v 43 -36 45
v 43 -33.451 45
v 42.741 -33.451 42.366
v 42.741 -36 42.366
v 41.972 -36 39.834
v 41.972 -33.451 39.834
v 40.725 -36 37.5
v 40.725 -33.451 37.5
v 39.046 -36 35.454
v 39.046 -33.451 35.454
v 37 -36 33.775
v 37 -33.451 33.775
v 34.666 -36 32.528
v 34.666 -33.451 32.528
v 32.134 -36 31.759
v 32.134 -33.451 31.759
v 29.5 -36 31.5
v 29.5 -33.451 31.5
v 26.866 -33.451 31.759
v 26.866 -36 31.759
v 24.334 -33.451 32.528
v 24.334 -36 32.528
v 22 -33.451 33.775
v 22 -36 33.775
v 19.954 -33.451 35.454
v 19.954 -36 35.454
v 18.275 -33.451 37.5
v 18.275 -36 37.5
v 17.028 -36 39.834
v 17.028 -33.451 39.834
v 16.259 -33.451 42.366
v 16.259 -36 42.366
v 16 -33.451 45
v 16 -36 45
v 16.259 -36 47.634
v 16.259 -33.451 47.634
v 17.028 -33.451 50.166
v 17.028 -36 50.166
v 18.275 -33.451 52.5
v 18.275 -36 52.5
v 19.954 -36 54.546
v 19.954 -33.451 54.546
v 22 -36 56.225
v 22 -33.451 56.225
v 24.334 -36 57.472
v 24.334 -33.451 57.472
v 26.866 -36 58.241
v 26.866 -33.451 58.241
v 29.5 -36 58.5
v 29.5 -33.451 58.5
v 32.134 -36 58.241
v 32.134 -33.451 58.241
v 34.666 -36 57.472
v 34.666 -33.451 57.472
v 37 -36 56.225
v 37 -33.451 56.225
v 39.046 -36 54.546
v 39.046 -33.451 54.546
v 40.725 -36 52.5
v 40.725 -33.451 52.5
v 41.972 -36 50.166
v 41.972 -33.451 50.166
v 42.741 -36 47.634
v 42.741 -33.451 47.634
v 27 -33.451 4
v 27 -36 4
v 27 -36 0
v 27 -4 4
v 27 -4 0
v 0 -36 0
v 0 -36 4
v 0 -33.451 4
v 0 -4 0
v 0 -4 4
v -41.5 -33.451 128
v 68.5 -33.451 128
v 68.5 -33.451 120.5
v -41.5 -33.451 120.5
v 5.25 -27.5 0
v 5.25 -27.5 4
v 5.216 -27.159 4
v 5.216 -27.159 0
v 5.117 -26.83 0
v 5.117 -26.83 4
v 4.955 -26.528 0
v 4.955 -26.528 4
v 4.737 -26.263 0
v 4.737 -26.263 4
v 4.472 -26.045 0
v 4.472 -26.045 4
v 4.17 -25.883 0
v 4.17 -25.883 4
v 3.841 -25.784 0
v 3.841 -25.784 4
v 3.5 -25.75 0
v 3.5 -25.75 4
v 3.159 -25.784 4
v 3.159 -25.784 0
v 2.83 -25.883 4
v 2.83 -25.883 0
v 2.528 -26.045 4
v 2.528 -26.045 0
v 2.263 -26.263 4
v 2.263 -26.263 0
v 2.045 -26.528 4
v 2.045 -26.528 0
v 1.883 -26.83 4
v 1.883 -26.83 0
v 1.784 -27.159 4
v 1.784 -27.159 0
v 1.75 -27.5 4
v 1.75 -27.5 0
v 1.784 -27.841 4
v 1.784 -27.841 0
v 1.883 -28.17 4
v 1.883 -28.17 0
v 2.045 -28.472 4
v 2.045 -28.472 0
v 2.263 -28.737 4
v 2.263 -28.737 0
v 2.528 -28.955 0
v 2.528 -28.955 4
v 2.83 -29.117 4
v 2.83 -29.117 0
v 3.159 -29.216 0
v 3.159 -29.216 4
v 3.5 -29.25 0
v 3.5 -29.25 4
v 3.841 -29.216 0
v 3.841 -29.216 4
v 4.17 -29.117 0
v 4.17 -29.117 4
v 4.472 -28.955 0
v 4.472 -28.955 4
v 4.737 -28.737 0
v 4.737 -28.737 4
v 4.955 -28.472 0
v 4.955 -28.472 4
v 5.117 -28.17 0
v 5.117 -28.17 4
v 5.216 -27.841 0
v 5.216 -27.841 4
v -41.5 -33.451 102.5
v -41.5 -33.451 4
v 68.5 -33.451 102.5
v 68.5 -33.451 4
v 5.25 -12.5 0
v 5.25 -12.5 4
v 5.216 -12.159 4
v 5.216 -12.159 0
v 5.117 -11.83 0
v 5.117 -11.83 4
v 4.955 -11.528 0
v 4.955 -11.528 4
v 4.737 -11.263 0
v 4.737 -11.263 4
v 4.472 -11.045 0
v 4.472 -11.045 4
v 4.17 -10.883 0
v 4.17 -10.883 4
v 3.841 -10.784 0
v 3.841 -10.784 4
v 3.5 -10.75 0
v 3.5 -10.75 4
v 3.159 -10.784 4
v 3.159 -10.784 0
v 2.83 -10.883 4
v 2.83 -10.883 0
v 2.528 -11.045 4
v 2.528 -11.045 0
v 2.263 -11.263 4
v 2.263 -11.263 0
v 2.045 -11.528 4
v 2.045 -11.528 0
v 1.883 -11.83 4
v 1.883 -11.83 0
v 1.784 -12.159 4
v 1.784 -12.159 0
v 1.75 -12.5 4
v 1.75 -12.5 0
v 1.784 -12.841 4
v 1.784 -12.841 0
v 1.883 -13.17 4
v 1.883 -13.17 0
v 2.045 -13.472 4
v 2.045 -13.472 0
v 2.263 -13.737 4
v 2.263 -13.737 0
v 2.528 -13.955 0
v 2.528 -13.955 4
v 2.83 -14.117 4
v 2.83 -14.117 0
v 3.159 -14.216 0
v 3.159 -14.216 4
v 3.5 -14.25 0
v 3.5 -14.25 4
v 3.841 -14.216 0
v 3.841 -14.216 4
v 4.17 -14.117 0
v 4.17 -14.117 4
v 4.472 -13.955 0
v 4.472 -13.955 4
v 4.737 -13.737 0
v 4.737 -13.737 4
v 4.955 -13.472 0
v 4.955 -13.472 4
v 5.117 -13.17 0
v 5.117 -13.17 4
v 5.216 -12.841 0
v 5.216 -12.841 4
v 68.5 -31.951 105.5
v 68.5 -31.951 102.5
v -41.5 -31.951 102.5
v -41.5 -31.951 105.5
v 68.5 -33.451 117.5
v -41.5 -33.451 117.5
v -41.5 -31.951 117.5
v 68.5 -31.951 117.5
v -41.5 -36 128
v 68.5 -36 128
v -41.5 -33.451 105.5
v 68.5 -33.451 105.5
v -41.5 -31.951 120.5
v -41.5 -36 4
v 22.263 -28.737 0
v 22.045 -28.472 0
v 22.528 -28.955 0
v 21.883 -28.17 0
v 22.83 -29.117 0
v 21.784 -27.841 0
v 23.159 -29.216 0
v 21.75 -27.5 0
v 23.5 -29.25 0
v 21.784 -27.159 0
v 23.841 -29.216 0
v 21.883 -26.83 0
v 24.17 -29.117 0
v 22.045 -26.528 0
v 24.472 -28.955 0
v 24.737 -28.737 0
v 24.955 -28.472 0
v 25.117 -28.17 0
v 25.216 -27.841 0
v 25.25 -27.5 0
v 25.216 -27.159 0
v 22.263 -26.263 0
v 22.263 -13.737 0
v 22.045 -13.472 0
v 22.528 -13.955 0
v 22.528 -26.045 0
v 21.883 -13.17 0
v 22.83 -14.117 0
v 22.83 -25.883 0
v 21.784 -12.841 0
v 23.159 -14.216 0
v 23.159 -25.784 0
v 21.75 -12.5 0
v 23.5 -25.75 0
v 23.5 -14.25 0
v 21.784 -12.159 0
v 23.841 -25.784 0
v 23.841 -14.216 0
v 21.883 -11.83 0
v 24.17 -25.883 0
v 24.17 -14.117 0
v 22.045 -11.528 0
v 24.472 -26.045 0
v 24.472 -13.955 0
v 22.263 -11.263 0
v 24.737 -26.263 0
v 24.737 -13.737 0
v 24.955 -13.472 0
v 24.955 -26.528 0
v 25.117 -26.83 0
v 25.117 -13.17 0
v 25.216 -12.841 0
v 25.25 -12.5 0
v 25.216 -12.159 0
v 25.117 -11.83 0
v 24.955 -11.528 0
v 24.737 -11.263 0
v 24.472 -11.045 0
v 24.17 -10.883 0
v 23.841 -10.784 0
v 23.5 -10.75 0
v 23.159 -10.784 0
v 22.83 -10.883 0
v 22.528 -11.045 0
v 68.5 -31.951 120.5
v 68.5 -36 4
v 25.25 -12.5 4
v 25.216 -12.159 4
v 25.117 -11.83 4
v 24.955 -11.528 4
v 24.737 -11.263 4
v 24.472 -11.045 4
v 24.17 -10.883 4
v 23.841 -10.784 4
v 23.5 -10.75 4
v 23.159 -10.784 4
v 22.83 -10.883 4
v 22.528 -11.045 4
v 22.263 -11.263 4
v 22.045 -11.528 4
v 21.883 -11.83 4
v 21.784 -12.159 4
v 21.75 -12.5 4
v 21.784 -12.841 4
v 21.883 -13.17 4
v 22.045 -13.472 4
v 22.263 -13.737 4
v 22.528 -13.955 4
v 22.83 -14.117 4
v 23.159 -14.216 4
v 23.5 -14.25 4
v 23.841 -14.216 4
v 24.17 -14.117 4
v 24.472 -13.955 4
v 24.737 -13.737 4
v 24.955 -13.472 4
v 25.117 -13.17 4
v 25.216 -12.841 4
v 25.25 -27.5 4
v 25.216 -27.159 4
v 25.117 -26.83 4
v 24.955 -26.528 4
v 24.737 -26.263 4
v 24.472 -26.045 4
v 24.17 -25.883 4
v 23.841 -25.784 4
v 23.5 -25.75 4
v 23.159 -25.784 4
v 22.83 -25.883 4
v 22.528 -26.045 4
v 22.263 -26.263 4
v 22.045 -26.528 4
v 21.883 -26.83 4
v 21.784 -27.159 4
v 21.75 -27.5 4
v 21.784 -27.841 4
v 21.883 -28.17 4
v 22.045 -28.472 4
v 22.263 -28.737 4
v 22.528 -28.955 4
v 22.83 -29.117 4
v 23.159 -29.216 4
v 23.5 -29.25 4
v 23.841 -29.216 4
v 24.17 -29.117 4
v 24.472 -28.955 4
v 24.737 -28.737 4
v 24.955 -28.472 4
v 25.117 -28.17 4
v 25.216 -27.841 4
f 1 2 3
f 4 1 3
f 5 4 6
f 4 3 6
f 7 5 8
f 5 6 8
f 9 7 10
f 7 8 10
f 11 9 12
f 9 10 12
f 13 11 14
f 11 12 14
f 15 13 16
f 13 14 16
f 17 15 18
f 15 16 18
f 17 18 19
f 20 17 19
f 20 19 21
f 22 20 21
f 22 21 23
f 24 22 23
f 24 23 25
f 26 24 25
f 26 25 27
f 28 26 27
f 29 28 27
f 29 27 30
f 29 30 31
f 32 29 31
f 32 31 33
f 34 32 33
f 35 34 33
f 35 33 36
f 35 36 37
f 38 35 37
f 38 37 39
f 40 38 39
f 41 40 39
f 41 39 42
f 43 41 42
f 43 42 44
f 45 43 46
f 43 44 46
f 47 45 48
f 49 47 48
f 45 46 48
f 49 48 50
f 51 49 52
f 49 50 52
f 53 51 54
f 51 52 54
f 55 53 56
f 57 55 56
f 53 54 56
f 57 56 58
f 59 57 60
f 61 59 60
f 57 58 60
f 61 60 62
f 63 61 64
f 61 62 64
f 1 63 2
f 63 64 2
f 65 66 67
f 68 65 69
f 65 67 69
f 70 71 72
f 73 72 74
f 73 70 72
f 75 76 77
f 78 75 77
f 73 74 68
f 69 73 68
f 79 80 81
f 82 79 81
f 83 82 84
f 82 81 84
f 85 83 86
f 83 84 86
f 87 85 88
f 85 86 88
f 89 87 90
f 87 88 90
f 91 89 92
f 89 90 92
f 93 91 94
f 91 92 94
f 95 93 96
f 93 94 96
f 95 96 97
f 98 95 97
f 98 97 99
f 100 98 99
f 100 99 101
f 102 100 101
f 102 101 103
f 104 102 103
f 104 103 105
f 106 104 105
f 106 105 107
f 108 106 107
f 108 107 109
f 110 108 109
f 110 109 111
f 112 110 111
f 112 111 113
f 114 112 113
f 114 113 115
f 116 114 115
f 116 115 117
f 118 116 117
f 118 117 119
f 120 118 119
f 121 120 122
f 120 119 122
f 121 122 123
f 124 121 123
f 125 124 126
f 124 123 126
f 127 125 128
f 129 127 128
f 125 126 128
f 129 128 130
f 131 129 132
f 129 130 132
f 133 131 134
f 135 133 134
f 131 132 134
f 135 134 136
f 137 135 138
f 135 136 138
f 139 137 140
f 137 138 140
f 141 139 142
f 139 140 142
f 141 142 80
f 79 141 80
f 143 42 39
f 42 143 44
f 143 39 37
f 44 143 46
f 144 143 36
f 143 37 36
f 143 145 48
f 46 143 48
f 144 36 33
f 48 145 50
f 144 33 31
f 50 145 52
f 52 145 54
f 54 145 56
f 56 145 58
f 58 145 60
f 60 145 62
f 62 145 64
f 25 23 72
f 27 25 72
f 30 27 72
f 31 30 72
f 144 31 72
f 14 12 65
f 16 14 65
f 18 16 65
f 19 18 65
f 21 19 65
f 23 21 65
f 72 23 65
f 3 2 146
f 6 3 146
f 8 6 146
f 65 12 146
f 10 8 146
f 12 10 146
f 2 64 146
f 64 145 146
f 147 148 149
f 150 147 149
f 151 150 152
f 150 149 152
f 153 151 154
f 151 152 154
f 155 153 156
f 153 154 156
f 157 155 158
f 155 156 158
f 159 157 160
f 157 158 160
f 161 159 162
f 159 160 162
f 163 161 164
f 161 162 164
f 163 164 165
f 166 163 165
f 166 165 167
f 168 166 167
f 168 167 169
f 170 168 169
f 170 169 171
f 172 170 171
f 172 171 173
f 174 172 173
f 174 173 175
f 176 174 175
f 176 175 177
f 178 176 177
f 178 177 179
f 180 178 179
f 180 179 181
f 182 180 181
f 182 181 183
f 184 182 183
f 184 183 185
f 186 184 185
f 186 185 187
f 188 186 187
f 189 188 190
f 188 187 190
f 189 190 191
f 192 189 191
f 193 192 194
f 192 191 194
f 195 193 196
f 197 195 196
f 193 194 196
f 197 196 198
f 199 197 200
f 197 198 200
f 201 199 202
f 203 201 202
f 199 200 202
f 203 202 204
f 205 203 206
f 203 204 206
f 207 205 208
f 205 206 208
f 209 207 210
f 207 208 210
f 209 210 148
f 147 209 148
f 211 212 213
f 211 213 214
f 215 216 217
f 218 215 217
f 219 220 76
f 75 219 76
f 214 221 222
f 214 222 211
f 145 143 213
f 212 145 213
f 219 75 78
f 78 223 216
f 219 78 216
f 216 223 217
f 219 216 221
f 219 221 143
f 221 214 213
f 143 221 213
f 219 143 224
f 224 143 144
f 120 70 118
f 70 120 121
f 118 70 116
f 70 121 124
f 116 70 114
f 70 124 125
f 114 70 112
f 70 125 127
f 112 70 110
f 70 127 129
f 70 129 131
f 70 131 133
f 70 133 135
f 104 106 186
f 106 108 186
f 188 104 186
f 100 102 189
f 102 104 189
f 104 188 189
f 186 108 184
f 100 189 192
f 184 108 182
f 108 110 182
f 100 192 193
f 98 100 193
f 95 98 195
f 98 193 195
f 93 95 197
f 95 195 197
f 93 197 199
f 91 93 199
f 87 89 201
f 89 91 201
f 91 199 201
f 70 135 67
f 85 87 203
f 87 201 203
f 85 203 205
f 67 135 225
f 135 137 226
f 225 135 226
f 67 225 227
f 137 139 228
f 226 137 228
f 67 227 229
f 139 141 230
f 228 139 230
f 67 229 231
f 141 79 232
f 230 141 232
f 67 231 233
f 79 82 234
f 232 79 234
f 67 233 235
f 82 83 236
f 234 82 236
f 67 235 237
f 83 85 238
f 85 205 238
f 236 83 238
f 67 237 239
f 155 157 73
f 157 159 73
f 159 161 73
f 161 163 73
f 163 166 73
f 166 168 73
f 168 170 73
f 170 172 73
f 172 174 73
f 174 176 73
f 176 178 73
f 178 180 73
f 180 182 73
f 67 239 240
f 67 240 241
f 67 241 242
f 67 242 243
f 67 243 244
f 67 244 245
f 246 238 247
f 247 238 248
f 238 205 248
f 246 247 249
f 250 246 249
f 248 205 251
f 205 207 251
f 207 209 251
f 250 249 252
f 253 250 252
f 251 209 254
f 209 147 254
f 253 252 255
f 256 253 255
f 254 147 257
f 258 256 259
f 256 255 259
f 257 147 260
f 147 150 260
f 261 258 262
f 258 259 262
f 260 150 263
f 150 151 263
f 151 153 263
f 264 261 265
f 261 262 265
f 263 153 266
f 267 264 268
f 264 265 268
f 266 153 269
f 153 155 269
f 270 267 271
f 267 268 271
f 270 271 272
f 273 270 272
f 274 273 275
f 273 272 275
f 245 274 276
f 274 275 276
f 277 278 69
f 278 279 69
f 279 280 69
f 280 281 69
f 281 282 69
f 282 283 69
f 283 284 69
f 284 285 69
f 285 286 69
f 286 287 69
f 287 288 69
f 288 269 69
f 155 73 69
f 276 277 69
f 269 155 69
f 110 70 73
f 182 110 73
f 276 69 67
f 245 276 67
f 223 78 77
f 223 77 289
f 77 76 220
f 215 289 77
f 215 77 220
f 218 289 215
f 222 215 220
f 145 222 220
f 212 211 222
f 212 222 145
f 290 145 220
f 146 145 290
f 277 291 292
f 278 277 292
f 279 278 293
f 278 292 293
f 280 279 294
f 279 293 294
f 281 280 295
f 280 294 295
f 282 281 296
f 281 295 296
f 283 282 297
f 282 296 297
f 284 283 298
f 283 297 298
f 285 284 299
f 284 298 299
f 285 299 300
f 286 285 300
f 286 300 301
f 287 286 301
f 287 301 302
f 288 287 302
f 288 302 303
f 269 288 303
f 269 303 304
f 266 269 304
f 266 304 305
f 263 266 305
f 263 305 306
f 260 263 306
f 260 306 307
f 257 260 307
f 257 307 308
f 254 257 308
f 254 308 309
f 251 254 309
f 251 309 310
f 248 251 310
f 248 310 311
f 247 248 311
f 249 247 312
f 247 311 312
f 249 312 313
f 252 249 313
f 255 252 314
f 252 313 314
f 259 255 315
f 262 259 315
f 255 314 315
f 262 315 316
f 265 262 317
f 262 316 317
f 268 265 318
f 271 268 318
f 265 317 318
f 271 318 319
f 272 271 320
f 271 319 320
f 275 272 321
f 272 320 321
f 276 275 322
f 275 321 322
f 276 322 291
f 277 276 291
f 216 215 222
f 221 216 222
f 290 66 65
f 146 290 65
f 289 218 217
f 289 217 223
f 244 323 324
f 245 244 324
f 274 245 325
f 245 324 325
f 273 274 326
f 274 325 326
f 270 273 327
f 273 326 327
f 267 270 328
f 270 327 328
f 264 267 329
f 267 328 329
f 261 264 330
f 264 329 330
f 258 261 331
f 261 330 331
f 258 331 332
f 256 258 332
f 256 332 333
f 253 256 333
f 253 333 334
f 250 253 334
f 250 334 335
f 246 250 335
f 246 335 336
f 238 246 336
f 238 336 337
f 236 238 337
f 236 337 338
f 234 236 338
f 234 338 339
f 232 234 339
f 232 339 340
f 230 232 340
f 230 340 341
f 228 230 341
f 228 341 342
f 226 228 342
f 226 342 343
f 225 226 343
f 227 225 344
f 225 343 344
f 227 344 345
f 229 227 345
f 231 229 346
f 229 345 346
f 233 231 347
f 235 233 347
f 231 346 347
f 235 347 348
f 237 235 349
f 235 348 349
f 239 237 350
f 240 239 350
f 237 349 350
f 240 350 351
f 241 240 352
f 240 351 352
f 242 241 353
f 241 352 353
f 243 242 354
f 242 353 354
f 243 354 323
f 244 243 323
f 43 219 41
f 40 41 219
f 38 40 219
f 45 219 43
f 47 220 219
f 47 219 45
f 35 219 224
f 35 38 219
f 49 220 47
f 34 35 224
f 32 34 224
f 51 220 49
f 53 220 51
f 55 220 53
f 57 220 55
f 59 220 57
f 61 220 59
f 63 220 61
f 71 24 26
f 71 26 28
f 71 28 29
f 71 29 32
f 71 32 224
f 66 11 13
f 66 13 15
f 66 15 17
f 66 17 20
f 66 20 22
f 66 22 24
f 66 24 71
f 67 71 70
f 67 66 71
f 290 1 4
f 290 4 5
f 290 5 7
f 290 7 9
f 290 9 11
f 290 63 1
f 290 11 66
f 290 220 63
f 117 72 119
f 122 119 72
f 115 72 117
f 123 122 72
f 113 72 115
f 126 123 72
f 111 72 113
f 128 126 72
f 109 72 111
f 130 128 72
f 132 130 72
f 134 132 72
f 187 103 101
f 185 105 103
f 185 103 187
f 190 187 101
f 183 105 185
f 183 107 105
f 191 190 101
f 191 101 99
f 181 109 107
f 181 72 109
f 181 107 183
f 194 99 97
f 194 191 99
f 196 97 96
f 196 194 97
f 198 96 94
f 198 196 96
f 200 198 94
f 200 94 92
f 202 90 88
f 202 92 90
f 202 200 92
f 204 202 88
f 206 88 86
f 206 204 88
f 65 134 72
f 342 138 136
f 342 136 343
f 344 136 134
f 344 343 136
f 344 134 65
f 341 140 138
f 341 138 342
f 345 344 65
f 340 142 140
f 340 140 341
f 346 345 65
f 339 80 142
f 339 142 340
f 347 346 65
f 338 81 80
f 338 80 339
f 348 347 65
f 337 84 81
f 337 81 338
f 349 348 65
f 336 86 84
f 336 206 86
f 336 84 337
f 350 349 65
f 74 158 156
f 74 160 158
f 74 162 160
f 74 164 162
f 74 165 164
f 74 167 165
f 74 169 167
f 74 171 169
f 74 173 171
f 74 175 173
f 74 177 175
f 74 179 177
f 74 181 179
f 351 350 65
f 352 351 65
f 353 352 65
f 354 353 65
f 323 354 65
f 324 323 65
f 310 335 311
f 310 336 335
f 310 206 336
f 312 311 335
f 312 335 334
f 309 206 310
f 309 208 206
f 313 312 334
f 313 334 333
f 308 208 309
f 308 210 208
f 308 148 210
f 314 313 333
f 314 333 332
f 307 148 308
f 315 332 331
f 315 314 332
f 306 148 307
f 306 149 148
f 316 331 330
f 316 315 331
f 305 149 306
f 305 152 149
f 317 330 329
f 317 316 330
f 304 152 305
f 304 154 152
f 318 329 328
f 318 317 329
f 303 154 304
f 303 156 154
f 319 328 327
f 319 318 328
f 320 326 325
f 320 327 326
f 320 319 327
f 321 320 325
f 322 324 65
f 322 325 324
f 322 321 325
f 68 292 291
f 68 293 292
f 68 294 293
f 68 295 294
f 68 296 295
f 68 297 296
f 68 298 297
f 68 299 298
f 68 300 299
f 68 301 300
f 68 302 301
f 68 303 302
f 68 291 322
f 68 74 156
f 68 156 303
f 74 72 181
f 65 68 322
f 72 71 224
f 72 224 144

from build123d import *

# Parameters (mm, degrees)
SCHIZZO1_W                        = 27
SCHIZZO1_H                        = 36
ESTRUSIONE_ESTRUSIONE1_DEPTH      = 4
SCHIZZO10_R                       = 1.75
TAGLIO_ESTRUSIONE5_DEPTH          = 10
SCHIZZO12_W                       = 124
SCHIZZO12_H                       = 2.549259356
ESTRUSIONE_ESTRUSIONE2_DEPTH      = 55
ESTRUSIONE_ESTRUSIONE2_DEPTH_BACK = 55
SCHIZZO14_W                       = 3
SCHIZZO14_H                       = 1.5
ESTRUSIONE_ESTRUSIONE3_DEPTH      = 110
SCHIZZO15_W                       = 27
SCHIZZO15_H                       = 4
TAGLIO_ESTRUSIONE6_DEPTH          = 5
SCHIZZO16_R                       = 13.5
TAGLIO_ESTRUSIONE7_DEPTH          = 10


with BuildPart() as part:
    # Schizzo1 → Estrusione-Estrusione1 (new body)
    with BuildSketch(Plane.XY):
        with Locations((13.5, -18)):
            Rectangle(SCHIZZO1_W, SCHIZZO1_H)
    extrude(amount=ESTRUSIONE_ESTRUSIONE1_DEPTH)

    # Schizzo10 → Taglio-Estrusione5 (cut)
    with BuildSketch(Plane.XY.offset(4)):
        with Locations((3.5, -12.5)):
            Circle(SCHIZZO10_R)
        with Locations((23.5, -12.5)):
            Circle(SCHIZZO10_R)
        with Locations((23.5, -27.5)):
            Circle(SCHIZZO10_R)
        with Locations((3.5, -27.5)):
            Circle(SCHIZZO10_R)
    extrude(amount=-TAGLIO_ESTRUSIONE5_DEPTH, mode=Mode.SUBTRACT)

    # Schizzo12 → Estrusione-Estrusione2 (add, two sides)
    with BuildSketch(Plane(origin=(13.5, 0, 0), x_dir=(0, 0, -1), z_dir=(1, 0, 0))) as estrusione_estrusione2_sk:
        with Locations((-66, -34.725370322)):
            Rectangle(SCHIZZO12_W, SCHIZZO12_H)
    extrude(amount=ESTRUSIONE_ESTRUSIONE2_DEPTH)
    extrude(estrusione_estrusione2_sk.sketch, amount=-ESTRUSIONE_ESTRUSIONE2_DEPTH_BACK)

    # Schizzo14 → Estrusione-Estrusione3 (add)
    with BuildSketch(Plane.ZY.offset(41.5)):
        with Locations((104, -32.700740644)):
            Rectangle(SCHIZZO14_W, SCHIZZO14_H)
        with Locations((119, -32.700740644)):
            Rectangle(SCHIZZO14_W, SCHIZZO14_H)
    extrude(amount=-ESTRUSIONE_ESTRUSIONE3_DEPTH)

    # Schizzo15 → Taglio-Estrusione6 (cut, through all)
    with BuildSketch(Plane.XY.offset(4)):
        with Locations((13.5, -2)):
            Rectangle(SCHIZZO15_W, SCHIZZO15_H)
    extrude(amount=-TAGLIO_ESTRUSIONE6_DEPTH, mode=Mode.SUBTRACT)

    # Schizzo16 → Taglio-Estrusione7 (cut)
    with BuildSketch(Plane(origin=(0, -33.450740644, 0), x_dir=(1, 0, 0), z_dir=(0, 1, 0))):
        with Locations((29.5, -45)):
            Circle(SCHIZZO16_R)
    extrude(amount=-TAGLIO_ESTRUSIONE7_DEPTH, mode=Mode.SUBTRACT)


solid = part.part
